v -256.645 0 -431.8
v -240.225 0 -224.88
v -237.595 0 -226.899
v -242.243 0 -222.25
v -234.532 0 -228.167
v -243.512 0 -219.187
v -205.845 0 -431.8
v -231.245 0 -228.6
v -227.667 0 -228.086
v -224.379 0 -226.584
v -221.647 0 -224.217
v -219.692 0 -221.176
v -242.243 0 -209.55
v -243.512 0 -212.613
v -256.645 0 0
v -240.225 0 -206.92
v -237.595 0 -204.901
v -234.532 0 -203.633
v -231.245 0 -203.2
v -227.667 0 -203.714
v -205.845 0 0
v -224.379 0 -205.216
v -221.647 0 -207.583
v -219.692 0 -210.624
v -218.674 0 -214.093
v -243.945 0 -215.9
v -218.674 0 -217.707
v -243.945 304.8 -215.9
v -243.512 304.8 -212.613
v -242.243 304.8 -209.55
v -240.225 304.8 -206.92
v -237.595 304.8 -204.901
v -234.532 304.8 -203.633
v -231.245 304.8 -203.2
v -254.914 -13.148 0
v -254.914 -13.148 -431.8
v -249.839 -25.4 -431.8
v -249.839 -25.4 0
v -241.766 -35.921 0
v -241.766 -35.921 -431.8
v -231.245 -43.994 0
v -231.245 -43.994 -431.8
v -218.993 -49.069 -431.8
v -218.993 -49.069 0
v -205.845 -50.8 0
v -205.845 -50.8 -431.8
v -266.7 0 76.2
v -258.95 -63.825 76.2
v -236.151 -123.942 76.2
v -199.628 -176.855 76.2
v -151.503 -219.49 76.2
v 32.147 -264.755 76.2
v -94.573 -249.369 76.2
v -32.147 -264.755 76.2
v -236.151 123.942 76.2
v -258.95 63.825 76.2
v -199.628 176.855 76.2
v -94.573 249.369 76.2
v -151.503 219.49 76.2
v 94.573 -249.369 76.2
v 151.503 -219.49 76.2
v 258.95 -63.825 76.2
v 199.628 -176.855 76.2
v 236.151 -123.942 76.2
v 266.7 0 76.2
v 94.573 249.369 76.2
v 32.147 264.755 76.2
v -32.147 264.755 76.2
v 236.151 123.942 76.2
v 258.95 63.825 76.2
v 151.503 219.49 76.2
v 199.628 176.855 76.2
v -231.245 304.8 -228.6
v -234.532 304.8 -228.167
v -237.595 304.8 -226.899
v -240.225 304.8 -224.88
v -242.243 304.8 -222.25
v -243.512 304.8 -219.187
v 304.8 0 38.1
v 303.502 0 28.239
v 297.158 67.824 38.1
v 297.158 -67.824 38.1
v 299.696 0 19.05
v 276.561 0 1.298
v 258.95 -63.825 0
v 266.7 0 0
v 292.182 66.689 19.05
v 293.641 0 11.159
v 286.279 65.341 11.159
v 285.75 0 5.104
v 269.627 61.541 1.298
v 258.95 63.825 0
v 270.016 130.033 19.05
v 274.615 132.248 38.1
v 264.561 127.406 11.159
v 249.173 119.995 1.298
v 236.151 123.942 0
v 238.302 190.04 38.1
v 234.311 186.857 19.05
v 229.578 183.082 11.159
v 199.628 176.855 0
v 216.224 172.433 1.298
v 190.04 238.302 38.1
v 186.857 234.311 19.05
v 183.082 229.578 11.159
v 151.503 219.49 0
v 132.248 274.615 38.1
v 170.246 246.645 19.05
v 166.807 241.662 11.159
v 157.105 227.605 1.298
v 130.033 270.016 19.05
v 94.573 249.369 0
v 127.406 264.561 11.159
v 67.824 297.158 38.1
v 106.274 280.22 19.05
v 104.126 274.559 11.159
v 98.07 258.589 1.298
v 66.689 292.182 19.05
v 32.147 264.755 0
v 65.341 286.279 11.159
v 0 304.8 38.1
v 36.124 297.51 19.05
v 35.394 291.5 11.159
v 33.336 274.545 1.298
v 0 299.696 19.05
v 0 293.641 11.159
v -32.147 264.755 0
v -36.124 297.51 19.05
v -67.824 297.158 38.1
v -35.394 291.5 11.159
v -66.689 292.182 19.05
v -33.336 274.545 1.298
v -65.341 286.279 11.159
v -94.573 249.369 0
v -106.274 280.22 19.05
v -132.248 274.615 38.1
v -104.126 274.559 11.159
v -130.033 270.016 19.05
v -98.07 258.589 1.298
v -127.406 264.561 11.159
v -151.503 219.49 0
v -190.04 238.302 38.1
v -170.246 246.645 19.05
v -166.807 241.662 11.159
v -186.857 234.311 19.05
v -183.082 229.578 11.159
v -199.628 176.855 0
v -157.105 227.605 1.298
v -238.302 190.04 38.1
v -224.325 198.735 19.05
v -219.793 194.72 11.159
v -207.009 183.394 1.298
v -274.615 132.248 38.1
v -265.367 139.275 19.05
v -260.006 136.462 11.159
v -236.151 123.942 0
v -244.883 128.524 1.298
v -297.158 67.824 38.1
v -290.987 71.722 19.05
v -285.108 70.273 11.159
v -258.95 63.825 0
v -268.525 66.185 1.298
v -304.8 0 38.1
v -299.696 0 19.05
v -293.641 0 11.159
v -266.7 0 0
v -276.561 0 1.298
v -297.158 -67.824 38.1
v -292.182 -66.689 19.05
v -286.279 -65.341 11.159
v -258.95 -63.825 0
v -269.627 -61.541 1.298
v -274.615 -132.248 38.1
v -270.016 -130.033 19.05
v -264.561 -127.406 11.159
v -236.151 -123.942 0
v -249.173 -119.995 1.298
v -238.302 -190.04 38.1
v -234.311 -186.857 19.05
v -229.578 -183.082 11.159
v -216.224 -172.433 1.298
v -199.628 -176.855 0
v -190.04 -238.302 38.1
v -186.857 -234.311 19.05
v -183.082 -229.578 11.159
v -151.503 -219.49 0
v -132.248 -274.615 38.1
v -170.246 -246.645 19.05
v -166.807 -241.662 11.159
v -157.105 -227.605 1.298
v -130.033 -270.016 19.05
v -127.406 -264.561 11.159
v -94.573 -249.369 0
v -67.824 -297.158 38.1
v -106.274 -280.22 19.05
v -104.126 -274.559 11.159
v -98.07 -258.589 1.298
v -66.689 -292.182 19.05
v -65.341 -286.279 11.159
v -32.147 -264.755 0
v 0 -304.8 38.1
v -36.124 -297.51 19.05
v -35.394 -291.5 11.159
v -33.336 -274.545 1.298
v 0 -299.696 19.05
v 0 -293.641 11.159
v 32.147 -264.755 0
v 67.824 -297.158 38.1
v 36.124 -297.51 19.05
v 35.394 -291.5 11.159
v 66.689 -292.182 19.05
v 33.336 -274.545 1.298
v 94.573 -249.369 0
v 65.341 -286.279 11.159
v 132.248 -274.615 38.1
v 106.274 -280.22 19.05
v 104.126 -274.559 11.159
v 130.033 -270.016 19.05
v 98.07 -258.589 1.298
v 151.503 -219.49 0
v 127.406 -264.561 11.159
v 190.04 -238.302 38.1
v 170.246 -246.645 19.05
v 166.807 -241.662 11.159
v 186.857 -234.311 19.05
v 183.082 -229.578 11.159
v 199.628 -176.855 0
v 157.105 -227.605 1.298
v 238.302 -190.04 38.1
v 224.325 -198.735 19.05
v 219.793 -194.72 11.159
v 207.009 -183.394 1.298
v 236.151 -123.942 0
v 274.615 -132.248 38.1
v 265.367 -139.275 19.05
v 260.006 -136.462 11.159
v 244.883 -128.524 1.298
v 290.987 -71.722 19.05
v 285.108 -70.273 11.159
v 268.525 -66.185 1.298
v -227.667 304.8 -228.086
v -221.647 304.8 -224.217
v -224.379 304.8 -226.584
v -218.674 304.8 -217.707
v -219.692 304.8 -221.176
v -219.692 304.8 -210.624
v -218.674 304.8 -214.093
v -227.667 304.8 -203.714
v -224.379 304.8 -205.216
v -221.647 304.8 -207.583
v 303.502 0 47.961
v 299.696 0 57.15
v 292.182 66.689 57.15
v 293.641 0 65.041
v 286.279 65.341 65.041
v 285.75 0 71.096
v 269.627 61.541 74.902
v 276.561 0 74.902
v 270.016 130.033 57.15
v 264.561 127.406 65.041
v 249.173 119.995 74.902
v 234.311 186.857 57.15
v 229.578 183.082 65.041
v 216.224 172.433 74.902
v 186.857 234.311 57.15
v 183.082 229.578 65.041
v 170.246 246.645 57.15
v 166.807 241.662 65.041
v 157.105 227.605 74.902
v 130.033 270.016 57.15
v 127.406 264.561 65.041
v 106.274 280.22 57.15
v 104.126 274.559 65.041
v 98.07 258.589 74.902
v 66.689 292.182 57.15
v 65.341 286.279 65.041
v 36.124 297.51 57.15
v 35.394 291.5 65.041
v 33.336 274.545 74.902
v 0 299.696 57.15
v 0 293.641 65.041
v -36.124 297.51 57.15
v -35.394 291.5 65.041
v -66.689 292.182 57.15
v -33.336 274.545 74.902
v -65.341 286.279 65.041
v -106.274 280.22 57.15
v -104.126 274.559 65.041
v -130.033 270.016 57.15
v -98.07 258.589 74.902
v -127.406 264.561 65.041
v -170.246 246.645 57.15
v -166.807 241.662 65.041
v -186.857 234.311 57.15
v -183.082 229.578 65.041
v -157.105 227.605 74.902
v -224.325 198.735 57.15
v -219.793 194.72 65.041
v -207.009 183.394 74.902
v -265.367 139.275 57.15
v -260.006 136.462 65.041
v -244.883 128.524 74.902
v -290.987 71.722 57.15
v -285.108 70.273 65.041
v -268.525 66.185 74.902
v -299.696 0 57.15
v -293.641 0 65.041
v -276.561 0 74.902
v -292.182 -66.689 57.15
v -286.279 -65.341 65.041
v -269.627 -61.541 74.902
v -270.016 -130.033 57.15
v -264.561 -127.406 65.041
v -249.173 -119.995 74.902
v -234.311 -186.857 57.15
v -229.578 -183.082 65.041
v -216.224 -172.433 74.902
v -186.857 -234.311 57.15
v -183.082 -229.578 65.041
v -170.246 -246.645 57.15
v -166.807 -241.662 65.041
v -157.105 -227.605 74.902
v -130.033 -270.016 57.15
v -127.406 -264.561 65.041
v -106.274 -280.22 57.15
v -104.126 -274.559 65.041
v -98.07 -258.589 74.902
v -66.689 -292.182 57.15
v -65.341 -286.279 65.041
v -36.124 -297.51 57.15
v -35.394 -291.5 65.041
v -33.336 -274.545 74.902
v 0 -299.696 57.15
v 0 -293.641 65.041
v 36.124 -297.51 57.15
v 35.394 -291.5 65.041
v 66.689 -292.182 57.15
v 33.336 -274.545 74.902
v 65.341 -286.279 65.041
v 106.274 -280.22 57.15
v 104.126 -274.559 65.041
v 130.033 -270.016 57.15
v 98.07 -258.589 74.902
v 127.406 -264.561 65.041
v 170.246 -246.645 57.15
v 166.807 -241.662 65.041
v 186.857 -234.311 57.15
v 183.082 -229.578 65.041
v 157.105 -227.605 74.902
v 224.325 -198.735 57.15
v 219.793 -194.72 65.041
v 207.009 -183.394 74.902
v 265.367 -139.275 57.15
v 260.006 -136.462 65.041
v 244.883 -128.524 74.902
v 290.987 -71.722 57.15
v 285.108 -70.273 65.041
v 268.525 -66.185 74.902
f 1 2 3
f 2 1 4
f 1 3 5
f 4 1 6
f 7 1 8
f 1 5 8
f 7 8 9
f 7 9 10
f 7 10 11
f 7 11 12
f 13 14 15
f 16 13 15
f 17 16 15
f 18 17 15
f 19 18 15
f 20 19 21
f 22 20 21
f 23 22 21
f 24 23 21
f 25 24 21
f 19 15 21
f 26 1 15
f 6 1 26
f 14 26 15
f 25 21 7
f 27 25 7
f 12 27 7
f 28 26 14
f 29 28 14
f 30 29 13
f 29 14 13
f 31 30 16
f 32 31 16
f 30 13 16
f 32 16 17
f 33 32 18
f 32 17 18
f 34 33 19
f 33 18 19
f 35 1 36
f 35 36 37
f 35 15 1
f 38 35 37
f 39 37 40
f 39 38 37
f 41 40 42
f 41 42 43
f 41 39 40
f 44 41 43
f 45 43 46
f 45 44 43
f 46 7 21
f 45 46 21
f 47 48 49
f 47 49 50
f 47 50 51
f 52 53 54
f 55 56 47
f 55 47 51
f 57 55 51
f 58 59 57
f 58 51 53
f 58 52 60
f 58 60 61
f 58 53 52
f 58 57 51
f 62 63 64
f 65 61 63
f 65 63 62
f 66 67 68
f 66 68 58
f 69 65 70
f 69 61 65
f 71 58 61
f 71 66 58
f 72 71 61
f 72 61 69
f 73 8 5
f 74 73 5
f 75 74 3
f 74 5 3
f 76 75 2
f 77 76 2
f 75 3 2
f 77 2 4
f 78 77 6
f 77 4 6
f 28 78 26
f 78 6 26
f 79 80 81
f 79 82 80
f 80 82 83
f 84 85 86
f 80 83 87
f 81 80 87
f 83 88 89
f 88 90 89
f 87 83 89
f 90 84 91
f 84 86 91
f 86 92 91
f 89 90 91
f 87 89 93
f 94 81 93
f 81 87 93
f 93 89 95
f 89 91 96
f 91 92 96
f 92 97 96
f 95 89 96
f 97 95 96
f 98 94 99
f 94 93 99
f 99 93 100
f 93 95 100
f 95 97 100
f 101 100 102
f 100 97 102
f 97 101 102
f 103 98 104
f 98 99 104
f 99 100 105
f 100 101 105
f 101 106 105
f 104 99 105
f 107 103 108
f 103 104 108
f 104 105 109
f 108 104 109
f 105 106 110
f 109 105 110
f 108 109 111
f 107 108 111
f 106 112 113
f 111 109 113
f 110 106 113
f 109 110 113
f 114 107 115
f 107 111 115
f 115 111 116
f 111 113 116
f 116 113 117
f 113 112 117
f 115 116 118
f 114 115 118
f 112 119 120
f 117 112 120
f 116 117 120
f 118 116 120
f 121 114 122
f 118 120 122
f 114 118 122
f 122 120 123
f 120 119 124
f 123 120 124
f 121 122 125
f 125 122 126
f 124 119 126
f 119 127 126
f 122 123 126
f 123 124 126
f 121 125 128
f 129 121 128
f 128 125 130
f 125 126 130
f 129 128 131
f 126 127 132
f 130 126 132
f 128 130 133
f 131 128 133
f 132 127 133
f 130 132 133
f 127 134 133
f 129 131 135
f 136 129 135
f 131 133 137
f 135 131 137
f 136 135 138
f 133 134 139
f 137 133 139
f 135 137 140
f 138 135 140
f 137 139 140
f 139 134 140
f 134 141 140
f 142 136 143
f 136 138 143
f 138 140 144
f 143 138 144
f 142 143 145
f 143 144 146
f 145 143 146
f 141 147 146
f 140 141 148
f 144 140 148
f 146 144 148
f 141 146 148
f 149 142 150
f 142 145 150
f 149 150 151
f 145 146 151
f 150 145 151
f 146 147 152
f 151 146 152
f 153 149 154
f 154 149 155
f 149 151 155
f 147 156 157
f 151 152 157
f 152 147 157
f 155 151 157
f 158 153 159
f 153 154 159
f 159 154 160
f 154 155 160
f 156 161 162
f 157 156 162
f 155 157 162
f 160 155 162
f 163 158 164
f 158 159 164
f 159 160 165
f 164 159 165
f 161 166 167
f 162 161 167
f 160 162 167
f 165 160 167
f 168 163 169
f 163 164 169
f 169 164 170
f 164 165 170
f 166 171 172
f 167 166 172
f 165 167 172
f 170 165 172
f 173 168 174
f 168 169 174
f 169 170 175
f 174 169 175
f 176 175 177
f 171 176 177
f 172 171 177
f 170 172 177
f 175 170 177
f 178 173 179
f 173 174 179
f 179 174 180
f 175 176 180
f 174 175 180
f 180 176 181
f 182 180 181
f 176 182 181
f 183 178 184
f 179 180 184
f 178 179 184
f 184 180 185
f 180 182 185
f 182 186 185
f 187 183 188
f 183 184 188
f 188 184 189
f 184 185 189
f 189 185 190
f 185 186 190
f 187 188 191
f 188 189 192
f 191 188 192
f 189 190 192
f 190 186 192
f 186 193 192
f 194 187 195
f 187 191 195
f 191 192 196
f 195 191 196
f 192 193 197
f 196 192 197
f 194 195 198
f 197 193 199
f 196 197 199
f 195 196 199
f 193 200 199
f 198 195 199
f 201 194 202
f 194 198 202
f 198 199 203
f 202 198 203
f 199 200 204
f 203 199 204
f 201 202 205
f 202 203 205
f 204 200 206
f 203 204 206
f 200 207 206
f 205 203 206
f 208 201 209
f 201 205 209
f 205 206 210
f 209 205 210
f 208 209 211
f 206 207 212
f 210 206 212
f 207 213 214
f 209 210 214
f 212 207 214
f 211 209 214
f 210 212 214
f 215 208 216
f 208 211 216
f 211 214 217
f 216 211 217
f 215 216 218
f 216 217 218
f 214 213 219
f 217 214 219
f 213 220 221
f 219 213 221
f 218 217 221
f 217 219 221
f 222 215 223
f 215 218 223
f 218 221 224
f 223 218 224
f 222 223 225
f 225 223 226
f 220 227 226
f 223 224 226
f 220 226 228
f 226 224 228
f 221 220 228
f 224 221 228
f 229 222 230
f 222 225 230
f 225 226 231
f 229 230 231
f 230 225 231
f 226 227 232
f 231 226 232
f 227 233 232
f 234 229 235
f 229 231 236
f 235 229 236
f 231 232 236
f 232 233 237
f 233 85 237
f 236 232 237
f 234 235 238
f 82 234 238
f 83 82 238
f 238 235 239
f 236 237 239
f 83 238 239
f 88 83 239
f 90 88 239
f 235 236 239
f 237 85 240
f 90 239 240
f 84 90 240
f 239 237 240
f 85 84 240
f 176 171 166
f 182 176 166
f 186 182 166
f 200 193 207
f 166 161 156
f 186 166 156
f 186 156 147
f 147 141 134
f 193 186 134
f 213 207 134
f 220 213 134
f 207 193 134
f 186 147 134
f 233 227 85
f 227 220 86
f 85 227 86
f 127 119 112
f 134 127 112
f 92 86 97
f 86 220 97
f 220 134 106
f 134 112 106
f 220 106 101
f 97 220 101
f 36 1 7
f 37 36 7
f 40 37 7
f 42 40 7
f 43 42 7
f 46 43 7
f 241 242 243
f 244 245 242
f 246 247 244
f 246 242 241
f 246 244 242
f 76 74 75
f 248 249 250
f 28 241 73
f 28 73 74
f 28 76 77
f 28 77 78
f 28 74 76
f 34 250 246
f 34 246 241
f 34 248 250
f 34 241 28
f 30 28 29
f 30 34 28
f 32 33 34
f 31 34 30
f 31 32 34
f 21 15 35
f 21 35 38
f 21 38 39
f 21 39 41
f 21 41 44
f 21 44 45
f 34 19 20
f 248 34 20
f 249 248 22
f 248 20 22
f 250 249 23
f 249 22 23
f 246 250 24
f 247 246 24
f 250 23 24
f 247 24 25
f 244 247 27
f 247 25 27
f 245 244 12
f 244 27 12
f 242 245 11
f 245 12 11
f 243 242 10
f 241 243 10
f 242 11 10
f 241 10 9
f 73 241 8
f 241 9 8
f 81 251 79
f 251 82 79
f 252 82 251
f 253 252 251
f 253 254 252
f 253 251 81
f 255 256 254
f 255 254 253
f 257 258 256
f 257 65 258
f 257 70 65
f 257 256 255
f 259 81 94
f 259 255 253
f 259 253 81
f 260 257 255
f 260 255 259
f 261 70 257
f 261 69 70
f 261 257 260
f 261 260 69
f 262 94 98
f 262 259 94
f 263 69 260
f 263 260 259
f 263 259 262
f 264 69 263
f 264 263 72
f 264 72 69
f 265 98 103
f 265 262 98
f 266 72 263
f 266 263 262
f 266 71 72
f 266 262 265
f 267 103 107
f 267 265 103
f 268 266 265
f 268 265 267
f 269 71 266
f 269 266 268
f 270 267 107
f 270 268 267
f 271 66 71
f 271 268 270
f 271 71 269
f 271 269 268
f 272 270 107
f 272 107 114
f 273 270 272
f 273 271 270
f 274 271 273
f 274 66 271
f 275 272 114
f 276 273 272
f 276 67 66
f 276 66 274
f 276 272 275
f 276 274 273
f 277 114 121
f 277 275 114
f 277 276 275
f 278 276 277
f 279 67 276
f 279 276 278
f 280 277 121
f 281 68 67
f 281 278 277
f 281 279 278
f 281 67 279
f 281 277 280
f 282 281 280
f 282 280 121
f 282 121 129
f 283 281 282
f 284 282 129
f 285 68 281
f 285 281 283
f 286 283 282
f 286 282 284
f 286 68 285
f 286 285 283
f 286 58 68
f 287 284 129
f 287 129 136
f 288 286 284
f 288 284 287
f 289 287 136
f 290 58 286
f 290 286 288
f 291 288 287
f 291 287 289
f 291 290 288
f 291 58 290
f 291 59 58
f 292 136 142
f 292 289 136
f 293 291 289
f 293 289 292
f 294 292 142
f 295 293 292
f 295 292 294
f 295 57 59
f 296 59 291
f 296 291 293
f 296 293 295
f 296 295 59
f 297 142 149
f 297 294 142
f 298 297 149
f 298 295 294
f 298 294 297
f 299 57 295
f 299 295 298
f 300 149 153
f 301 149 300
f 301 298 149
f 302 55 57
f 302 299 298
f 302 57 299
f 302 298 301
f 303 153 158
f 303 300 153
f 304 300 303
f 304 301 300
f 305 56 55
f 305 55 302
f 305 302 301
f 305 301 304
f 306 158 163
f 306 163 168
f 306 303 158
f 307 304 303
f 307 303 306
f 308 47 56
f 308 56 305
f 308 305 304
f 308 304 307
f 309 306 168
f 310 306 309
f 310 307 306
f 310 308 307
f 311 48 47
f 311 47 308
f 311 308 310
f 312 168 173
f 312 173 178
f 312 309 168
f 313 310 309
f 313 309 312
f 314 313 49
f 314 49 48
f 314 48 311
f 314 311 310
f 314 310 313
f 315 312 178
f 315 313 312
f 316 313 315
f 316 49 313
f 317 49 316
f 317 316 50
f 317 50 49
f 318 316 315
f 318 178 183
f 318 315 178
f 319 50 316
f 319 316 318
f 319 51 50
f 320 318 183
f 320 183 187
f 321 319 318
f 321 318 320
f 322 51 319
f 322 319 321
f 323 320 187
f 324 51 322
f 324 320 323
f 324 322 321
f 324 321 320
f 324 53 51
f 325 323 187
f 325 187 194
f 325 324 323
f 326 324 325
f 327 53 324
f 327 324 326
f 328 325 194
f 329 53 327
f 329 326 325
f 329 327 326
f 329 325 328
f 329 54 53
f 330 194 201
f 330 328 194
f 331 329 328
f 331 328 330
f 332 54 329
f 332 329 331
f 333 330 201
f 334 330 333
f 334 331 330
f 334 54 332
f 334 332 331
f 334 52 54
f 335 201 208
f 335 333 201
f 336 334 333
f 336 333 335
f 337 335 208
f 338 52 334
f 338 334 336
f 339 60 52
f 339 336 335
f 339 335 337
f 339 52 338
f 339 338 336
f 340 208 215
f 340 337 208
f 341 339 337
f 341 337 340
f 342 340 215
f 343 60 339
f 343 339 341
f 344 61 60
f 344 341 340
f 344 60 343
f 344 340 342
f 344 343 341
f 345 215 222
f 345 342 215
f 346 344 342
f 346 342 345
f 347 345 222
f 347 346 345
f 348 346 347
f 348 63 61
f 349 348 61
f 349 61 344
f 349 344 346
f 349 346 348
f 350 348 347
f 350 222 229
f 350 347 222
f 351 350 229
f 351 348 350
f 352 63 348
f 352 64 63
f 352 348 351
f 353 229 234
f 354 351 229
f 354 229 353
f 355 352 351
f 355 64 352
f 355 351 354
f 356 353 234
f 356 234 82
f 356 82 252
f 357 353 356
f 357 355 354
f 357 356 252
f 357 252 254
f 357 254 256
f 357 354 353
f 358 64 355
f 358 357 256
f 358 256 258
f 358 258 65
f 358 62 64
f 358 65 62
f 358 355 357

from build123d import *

# Parameters (mm, degrees)
F0_R     = 304.8
F1_DEPTH = 76.2
F2_R     = 38.09999
F3_W     = 50.8
F3_H     = 431.8
F4_DEPTH = 50.8
F5_R     = 50.79999
F7_DEPTH = 304.8


# Not quite as in the source:
# - a fillet or chamfer is up to 0.001 mm smaller than in the source, because OpenCascade refuses the exact size


with BuildPart() as f1:
    # F0 (on Top) → F1 (new body)
    with BuildSketch(Plane.XY):
        Circle(F0_R)
    extrude(amount=F1_DEPTH)

    # F2 (radius 38.1 in the source; OpenCascade refuses exactly that, so slightly less here)
    f2_edges = [f1.edges().sort_by_distance(p)[0] for p in [
        (-304.8, 0, 76.2),
        (-304.8, 0, 0),
    ]]
    fillet(f2_edges, radius=F2_R)


with BuildPart() as f4:
    # F3 (on Front) → F4 (new body)
    with BuildSketch(Plane.XZ):
        with Locations((-231.2447311898, -215.9)):
            Rectangle(F3_W, F3_H)
    extrude(amount=F4_DEPTH)

    # F5 (radius 50.8 in the source; OpenCascade refuses exactly that, so slightly less here)
    f5_edges = [f4.edges().sort_by_distance(p)[0] for p in [
        (-256.644731, -50.8, -215.9),
    ]]
    fillet(f5_edges, radius=F5_R)

    # F6 (on face) → F7 (join)
    with BuildSketch(Plane(origin=(0, 0, 0), x_dir=(-1, 0, 0), z_dir=(0, 1, 0))):
        with BuildLine():
            ThreePointArc((243.9447311898, -215.9), (240.2249873109, -206.9197438789), (231.2447311898, -203.2))
            Line((231.2447311898, -203.2), (231.2447311898, -228.6))
            ThreePointArc((231.2447311898, -228.6), (240.2249873109, -224.8802561211), (243.9447311898, -215.9))
        make_face()
        with BuildLine():
            Line((231.2447311898, -228.6), (231.2447311898, -203.2))
            ThreePointArc((231.2447311898, -203.2), (218.5447311898, -215.9), (231.2447311898, -228.6))
        make_face()
    extrude(amount=F7_DEPTH)


solid = Compound([f1.part, f4.part])
